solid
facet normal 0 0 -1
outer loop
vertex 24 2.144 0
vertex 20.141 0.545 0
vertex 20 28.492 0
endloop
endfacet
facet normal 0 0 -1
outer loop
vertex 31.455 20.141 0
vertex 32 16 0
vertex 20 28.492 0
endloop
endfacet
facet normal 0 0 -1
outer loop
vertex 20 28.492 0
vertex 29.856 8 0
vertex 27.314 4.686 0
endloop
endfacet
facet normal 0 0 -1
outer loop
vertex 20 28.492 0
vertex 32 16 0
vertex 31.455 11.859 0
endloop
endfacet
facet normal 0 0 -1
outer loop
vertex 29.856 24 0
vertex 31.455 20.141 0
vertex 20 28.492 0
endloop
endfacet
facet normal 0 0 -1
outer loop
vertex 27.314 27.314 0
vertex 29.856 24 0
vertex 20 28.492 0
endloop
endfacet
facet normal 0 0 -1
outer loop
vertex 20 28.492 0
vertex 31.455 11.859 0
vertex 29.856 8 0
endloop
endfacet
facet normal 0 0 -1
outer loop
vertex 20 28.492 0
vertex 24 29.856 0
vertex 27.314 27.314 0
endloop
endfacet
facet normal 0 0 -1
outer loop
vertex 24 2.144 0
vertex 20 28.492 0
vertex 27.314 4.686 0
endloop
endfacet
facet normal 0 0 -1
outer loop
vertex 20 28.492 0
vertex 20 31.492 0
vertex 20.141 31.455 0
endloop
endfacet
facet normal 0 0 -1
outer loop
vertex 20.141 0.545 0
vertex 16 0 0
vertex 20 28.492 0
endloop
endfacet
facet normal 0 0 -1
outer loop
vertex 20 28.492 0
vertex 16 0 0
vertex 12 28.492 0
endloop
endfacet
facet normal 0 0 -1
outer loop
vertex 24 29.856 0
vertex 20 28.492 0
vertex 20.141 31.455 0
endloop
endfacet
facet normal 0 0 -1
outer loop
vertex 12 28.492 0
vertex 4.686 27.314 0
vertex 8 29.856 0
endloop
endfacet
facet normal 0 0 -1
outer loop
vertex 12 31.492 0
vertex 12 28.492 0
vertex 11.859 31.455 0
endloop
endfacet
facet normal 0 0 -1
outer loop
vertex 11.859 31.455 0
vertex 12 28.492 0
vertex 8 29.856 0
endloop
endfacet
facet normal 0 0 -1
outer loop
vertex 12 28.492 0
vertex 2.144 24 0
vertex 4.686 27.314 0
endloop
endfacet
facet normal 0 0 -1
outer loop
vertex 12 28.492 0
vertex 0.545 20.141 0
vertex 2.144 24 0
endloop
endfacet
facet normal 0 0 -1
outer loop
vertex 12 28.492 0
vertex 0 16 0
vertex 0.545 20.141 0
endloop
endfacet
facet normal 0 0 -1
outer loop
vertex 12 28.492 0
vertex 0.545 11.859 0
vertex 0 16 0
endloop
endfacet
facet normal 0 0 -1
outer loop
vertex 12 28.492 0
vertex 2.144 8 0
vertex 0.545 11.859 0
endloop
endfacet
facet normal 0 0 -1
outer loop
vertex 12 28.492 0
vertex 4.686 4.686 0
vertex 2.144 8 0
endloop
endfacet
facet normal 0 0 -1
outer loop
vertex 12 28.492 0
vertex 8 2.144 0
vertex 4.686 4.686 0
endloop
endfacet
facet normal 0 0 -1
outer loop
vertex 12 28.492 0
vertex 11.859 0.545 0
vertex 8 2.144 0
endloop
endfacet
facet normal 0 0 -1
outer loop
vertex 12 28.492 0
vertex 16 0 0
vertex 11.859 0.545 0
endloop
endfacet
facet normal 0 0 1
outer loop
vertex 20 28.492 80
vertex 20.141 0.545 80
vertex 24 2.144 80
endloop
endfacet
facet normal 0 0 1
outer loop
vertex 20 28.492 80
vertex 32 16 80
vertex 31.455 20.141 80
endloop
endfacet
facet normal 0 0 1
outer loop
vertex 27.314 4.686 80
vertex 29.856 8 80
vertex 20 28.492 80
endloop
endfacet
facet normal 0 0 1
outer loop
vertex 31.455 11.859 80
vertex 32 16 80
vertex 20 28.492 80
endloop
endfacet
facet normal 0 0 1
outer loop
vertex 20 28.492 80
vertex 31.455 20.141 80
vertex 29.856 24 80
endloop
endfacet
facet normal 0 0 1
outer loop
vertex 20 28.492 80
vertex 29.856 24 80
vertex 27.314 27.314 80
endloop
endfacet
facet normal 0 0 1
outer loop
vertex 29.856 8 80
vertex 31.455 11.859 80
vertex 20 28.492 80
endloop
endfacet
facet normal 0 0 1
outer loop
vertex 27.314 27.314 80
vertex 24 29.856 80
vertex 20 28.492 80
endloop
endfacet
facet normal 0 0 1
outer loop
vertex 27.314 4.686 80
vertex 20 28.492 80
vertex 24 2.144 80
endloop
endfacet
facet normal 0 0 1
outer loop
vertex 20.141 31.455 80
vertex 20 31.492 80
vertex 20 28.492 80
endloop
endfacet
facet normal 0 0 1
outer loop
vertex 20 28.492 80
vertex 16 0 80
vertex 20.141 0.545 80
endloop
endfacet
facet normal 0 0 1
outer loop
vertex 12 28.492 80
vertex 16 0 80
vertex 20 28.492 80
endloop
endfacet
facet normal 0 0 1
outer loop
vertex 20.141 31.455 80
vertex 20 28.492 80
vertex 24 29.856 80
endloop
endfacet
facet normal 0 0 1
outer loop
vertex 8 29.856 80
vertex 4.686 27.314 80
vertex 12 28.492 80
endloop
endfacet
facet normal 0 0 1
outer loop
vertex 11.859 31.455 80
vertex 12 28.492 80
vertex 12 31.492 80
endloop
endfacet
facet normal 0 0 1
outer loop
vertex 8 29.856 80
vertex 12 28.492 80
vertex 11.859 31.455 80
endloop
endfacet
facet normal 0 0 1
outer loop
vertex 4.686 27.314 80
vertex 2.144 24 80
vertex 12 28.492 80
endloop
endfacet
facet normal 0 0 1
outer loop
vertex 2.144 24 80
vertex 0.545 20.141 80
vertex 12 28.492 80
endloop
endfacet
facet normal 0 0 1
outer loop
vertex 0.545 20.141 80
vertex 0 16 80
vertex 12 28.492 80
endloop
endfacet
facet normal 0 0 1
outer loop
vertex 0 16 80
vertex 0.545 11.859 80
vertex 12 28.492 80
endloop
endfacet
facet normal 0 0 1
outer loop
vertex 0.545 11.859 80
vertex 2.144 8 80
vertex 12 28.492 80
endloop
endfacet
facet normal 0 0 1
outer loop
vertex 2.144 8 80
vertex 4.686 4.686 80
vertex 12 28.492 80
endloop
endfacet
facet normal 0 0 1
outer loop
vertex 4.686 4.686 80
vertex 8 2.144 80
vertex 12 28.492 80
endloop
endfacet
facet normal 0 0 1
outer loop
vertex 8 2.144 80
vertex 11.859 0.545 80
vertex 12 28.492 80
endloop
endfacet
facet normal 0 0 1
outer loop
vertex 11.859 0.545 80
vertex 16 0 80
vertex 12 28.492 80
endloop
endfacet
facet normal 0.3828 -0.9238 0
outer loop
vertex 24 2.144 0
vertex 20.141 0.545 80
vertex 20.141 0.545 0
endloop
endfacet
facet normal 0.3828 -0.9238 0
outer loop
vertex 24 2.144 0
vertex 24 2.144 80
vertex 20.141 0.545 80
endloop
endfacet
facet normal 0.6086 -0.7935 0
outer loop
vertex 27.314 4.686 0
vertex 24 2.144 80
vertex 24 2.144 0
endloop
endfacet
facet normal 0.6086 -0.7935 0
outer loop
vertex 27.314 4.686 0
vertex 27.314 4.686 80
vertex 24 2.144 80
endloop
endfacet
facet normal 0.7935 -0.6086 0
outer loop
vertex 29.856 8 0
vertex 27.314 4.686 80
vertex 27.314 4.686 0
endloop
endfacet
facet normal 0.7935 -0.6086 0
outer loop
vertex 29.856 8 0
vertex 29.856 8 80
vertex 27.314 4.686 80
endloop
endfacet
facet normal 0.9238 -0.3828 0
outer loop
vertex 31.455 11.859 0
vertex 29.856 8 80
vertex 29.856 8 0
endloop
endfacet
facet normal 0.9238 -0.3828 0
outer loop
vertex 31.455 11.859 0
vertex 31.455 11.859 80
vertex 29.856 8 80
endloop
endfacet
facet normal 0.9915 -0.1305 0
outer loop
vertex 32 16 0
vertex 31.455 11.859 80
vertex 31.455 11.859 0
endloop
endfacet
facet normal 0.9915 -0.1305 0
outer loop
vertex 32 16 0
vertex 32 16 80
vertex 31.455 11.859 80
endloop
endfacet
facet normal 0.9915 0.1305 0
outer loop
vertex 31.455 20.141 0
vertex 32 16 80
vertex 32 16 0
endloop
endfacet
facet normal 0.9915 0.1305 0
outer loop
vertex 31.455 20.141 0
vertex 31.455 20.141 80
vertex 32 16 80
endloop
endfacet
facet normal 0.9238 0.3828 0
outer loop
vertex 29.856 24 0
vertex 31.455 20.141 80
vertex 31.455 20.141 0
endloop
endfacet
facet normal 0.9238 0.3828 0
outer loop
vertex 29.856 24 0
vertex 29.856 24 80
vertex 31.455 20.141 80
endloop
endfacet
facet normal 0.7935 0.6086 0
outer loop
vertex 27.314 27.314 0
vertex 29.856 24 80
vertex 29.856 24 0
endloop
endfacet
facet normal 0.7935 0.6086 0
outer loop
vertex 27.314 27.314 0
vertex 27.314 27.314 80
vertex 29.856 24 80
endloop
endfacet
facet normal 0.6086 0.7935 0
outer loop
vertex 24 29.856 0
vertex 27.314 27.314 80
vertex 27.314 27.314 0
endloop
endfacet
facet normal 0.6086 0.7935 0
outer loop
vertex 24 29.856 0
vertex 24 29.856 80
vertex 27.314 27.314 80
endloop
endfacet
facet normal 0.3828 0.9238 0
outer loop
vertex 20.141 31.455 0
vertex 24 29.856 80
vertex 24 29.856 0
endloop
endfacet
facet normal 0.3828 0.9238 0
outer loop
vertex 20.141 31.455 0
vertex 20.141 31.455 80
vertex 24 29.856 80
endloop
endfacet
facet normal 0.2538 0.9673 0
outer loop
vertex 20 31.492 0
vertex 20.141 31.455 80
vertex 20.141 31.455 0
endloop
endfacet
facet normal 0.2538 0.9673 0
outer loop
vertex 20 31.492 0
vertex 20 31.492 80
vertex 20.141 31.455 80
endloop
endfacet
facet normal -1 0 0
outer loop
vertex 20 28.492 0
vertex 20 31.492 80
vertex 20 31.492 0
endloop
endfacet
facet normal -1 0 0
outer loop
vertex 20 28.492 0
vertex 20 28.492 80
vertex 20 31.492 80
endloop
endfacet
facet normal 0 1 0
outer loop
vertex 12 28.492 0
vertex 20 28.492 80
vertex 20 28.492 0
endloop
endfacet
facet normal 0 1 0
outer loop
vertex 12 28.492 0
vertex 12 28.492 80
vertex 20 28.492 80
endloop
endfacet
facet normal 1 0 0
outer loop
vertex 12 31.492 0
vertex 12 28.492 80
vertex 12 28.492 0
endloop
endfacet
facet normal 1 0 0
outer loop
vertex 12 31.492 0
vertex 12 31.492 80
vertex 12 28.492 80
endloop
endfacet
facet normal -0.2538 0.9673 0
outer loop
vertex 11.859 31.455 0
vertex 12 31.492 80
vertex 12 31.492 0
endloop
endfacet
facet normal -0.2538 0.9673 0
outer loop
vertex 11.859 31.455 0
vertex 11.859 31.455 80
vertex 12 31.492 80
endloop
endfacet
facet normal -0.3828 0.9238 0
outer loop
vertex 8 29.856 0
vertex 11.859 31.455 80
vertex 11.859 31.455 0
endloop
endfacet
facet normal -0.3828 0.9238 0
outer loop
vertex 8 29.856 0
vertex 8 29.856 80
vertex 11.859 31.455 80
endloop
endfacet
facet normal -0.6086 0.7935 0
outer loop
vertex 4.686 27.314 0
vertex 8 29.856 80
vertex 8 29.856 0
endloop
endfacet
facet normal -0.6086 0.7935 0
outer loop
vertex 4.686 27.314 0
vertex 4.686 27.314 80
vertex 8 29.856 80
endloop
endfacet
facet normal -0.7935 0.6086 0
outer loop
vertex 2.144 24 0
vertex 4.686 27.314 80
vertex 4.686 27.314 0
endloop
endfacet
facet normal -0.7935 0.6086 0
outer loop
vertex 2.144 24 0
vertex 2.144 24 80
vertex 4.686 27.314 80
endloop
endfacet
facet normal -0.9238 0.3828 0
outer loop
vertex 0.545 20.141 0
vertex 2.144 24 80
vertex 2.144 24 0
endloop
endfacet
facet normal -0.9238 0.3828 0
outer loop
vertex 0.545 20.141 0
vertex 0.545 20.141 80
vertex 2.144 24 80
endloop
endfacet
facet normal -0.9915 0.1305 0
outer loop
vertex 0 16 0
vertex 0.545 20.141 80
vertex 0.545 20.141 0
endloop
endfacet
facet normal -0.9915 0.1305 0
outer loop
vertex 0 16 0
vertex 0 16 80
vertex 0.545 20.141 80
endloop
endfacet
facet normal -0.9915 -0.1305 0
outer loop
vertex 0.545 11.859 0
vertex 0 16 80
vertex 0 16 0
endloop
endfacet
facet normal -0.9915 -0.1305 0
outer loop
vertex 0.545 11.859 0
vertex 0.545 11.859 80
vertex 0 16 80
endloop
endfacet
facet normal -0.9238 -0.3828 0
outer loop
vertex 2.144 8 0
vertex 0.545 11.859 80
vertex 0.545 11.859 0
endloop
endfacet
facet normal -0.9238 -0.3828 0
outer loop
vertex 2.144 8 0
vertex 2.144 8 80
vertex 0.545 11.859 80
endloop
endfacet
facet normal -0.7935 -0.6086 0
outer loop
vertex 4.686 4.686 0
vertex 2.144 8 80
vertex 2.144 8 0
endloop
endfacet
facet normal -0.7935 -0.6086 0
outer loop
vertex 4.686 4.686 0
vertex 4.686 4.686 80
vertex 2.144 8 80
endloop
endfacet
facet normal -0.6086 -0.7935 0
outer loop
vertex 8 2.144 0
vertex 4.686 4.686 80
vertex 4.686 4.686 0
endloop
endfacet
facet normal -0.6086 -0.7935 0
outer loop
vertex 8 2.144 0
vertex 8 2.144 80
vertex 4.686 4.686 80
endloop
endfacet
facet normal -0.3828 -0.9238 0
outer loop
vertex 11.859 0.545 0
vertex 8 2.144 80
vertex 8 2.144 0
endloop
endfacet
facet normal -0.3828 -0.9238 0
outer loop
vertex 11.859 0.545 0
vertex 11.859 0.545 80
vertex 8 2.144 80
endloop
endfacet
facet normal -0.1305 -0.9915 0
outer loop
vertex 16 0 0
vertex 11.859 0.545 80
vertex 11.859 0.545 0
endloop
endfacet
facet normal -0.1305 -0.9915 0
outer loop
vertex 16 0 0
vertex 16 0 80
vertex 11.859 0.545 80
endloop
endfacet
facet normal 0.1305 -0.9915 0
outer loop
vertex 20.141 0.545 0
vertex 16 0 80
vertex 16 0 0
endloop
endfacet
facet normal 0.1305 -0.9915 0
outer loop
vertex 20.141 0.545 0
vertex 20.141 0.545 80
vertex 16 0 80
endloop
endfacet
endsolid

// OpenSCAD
$fn = 32;

// ----------------------------------------------------------------------
// Keyway shaft: d32 shaft, key 8 x 3 mm
// ----------------------------------------------------------------------

// --- parameters (mm) ---
shaft_r = 16;             // shaft radius
key_w = 8;                // keyway width
key_d = 3;                // keyway depth below the surface line
plate_t = 80;             // shaft length, Z (extrusion height)

shaft_d = 2 * shaft_r;  // shaft diameter
circle_step = 15;  // polygon sampling step, degrees

profile = [[11.859, 31.455], [8, 29.856], [4.686, 27.314], [2.144, 24], [0.545, 20.141], [0, 16], [0.545, 11.859], [2.144, 8], [4.686, 4.686], [8, 2.144], [11.859, 0.545], [16, 0], [20.141, 0.545], [24, 2.144], [27.314, 4.686], [29.856, 8], [31.455, 11.859], [32, 16], [31.455, 20.141], [29.856, 24], [27.314, 27.314], [24, 29.856], [20.141, 31.455], [20, 31.492], [20, 28.492], [12, 28.492], [12, 31.492]];  // primary outline, 27 points, counter clockwise

// --- the one profile operation ---
linear_extrude(height = plate_t) polygon(points = profile);
